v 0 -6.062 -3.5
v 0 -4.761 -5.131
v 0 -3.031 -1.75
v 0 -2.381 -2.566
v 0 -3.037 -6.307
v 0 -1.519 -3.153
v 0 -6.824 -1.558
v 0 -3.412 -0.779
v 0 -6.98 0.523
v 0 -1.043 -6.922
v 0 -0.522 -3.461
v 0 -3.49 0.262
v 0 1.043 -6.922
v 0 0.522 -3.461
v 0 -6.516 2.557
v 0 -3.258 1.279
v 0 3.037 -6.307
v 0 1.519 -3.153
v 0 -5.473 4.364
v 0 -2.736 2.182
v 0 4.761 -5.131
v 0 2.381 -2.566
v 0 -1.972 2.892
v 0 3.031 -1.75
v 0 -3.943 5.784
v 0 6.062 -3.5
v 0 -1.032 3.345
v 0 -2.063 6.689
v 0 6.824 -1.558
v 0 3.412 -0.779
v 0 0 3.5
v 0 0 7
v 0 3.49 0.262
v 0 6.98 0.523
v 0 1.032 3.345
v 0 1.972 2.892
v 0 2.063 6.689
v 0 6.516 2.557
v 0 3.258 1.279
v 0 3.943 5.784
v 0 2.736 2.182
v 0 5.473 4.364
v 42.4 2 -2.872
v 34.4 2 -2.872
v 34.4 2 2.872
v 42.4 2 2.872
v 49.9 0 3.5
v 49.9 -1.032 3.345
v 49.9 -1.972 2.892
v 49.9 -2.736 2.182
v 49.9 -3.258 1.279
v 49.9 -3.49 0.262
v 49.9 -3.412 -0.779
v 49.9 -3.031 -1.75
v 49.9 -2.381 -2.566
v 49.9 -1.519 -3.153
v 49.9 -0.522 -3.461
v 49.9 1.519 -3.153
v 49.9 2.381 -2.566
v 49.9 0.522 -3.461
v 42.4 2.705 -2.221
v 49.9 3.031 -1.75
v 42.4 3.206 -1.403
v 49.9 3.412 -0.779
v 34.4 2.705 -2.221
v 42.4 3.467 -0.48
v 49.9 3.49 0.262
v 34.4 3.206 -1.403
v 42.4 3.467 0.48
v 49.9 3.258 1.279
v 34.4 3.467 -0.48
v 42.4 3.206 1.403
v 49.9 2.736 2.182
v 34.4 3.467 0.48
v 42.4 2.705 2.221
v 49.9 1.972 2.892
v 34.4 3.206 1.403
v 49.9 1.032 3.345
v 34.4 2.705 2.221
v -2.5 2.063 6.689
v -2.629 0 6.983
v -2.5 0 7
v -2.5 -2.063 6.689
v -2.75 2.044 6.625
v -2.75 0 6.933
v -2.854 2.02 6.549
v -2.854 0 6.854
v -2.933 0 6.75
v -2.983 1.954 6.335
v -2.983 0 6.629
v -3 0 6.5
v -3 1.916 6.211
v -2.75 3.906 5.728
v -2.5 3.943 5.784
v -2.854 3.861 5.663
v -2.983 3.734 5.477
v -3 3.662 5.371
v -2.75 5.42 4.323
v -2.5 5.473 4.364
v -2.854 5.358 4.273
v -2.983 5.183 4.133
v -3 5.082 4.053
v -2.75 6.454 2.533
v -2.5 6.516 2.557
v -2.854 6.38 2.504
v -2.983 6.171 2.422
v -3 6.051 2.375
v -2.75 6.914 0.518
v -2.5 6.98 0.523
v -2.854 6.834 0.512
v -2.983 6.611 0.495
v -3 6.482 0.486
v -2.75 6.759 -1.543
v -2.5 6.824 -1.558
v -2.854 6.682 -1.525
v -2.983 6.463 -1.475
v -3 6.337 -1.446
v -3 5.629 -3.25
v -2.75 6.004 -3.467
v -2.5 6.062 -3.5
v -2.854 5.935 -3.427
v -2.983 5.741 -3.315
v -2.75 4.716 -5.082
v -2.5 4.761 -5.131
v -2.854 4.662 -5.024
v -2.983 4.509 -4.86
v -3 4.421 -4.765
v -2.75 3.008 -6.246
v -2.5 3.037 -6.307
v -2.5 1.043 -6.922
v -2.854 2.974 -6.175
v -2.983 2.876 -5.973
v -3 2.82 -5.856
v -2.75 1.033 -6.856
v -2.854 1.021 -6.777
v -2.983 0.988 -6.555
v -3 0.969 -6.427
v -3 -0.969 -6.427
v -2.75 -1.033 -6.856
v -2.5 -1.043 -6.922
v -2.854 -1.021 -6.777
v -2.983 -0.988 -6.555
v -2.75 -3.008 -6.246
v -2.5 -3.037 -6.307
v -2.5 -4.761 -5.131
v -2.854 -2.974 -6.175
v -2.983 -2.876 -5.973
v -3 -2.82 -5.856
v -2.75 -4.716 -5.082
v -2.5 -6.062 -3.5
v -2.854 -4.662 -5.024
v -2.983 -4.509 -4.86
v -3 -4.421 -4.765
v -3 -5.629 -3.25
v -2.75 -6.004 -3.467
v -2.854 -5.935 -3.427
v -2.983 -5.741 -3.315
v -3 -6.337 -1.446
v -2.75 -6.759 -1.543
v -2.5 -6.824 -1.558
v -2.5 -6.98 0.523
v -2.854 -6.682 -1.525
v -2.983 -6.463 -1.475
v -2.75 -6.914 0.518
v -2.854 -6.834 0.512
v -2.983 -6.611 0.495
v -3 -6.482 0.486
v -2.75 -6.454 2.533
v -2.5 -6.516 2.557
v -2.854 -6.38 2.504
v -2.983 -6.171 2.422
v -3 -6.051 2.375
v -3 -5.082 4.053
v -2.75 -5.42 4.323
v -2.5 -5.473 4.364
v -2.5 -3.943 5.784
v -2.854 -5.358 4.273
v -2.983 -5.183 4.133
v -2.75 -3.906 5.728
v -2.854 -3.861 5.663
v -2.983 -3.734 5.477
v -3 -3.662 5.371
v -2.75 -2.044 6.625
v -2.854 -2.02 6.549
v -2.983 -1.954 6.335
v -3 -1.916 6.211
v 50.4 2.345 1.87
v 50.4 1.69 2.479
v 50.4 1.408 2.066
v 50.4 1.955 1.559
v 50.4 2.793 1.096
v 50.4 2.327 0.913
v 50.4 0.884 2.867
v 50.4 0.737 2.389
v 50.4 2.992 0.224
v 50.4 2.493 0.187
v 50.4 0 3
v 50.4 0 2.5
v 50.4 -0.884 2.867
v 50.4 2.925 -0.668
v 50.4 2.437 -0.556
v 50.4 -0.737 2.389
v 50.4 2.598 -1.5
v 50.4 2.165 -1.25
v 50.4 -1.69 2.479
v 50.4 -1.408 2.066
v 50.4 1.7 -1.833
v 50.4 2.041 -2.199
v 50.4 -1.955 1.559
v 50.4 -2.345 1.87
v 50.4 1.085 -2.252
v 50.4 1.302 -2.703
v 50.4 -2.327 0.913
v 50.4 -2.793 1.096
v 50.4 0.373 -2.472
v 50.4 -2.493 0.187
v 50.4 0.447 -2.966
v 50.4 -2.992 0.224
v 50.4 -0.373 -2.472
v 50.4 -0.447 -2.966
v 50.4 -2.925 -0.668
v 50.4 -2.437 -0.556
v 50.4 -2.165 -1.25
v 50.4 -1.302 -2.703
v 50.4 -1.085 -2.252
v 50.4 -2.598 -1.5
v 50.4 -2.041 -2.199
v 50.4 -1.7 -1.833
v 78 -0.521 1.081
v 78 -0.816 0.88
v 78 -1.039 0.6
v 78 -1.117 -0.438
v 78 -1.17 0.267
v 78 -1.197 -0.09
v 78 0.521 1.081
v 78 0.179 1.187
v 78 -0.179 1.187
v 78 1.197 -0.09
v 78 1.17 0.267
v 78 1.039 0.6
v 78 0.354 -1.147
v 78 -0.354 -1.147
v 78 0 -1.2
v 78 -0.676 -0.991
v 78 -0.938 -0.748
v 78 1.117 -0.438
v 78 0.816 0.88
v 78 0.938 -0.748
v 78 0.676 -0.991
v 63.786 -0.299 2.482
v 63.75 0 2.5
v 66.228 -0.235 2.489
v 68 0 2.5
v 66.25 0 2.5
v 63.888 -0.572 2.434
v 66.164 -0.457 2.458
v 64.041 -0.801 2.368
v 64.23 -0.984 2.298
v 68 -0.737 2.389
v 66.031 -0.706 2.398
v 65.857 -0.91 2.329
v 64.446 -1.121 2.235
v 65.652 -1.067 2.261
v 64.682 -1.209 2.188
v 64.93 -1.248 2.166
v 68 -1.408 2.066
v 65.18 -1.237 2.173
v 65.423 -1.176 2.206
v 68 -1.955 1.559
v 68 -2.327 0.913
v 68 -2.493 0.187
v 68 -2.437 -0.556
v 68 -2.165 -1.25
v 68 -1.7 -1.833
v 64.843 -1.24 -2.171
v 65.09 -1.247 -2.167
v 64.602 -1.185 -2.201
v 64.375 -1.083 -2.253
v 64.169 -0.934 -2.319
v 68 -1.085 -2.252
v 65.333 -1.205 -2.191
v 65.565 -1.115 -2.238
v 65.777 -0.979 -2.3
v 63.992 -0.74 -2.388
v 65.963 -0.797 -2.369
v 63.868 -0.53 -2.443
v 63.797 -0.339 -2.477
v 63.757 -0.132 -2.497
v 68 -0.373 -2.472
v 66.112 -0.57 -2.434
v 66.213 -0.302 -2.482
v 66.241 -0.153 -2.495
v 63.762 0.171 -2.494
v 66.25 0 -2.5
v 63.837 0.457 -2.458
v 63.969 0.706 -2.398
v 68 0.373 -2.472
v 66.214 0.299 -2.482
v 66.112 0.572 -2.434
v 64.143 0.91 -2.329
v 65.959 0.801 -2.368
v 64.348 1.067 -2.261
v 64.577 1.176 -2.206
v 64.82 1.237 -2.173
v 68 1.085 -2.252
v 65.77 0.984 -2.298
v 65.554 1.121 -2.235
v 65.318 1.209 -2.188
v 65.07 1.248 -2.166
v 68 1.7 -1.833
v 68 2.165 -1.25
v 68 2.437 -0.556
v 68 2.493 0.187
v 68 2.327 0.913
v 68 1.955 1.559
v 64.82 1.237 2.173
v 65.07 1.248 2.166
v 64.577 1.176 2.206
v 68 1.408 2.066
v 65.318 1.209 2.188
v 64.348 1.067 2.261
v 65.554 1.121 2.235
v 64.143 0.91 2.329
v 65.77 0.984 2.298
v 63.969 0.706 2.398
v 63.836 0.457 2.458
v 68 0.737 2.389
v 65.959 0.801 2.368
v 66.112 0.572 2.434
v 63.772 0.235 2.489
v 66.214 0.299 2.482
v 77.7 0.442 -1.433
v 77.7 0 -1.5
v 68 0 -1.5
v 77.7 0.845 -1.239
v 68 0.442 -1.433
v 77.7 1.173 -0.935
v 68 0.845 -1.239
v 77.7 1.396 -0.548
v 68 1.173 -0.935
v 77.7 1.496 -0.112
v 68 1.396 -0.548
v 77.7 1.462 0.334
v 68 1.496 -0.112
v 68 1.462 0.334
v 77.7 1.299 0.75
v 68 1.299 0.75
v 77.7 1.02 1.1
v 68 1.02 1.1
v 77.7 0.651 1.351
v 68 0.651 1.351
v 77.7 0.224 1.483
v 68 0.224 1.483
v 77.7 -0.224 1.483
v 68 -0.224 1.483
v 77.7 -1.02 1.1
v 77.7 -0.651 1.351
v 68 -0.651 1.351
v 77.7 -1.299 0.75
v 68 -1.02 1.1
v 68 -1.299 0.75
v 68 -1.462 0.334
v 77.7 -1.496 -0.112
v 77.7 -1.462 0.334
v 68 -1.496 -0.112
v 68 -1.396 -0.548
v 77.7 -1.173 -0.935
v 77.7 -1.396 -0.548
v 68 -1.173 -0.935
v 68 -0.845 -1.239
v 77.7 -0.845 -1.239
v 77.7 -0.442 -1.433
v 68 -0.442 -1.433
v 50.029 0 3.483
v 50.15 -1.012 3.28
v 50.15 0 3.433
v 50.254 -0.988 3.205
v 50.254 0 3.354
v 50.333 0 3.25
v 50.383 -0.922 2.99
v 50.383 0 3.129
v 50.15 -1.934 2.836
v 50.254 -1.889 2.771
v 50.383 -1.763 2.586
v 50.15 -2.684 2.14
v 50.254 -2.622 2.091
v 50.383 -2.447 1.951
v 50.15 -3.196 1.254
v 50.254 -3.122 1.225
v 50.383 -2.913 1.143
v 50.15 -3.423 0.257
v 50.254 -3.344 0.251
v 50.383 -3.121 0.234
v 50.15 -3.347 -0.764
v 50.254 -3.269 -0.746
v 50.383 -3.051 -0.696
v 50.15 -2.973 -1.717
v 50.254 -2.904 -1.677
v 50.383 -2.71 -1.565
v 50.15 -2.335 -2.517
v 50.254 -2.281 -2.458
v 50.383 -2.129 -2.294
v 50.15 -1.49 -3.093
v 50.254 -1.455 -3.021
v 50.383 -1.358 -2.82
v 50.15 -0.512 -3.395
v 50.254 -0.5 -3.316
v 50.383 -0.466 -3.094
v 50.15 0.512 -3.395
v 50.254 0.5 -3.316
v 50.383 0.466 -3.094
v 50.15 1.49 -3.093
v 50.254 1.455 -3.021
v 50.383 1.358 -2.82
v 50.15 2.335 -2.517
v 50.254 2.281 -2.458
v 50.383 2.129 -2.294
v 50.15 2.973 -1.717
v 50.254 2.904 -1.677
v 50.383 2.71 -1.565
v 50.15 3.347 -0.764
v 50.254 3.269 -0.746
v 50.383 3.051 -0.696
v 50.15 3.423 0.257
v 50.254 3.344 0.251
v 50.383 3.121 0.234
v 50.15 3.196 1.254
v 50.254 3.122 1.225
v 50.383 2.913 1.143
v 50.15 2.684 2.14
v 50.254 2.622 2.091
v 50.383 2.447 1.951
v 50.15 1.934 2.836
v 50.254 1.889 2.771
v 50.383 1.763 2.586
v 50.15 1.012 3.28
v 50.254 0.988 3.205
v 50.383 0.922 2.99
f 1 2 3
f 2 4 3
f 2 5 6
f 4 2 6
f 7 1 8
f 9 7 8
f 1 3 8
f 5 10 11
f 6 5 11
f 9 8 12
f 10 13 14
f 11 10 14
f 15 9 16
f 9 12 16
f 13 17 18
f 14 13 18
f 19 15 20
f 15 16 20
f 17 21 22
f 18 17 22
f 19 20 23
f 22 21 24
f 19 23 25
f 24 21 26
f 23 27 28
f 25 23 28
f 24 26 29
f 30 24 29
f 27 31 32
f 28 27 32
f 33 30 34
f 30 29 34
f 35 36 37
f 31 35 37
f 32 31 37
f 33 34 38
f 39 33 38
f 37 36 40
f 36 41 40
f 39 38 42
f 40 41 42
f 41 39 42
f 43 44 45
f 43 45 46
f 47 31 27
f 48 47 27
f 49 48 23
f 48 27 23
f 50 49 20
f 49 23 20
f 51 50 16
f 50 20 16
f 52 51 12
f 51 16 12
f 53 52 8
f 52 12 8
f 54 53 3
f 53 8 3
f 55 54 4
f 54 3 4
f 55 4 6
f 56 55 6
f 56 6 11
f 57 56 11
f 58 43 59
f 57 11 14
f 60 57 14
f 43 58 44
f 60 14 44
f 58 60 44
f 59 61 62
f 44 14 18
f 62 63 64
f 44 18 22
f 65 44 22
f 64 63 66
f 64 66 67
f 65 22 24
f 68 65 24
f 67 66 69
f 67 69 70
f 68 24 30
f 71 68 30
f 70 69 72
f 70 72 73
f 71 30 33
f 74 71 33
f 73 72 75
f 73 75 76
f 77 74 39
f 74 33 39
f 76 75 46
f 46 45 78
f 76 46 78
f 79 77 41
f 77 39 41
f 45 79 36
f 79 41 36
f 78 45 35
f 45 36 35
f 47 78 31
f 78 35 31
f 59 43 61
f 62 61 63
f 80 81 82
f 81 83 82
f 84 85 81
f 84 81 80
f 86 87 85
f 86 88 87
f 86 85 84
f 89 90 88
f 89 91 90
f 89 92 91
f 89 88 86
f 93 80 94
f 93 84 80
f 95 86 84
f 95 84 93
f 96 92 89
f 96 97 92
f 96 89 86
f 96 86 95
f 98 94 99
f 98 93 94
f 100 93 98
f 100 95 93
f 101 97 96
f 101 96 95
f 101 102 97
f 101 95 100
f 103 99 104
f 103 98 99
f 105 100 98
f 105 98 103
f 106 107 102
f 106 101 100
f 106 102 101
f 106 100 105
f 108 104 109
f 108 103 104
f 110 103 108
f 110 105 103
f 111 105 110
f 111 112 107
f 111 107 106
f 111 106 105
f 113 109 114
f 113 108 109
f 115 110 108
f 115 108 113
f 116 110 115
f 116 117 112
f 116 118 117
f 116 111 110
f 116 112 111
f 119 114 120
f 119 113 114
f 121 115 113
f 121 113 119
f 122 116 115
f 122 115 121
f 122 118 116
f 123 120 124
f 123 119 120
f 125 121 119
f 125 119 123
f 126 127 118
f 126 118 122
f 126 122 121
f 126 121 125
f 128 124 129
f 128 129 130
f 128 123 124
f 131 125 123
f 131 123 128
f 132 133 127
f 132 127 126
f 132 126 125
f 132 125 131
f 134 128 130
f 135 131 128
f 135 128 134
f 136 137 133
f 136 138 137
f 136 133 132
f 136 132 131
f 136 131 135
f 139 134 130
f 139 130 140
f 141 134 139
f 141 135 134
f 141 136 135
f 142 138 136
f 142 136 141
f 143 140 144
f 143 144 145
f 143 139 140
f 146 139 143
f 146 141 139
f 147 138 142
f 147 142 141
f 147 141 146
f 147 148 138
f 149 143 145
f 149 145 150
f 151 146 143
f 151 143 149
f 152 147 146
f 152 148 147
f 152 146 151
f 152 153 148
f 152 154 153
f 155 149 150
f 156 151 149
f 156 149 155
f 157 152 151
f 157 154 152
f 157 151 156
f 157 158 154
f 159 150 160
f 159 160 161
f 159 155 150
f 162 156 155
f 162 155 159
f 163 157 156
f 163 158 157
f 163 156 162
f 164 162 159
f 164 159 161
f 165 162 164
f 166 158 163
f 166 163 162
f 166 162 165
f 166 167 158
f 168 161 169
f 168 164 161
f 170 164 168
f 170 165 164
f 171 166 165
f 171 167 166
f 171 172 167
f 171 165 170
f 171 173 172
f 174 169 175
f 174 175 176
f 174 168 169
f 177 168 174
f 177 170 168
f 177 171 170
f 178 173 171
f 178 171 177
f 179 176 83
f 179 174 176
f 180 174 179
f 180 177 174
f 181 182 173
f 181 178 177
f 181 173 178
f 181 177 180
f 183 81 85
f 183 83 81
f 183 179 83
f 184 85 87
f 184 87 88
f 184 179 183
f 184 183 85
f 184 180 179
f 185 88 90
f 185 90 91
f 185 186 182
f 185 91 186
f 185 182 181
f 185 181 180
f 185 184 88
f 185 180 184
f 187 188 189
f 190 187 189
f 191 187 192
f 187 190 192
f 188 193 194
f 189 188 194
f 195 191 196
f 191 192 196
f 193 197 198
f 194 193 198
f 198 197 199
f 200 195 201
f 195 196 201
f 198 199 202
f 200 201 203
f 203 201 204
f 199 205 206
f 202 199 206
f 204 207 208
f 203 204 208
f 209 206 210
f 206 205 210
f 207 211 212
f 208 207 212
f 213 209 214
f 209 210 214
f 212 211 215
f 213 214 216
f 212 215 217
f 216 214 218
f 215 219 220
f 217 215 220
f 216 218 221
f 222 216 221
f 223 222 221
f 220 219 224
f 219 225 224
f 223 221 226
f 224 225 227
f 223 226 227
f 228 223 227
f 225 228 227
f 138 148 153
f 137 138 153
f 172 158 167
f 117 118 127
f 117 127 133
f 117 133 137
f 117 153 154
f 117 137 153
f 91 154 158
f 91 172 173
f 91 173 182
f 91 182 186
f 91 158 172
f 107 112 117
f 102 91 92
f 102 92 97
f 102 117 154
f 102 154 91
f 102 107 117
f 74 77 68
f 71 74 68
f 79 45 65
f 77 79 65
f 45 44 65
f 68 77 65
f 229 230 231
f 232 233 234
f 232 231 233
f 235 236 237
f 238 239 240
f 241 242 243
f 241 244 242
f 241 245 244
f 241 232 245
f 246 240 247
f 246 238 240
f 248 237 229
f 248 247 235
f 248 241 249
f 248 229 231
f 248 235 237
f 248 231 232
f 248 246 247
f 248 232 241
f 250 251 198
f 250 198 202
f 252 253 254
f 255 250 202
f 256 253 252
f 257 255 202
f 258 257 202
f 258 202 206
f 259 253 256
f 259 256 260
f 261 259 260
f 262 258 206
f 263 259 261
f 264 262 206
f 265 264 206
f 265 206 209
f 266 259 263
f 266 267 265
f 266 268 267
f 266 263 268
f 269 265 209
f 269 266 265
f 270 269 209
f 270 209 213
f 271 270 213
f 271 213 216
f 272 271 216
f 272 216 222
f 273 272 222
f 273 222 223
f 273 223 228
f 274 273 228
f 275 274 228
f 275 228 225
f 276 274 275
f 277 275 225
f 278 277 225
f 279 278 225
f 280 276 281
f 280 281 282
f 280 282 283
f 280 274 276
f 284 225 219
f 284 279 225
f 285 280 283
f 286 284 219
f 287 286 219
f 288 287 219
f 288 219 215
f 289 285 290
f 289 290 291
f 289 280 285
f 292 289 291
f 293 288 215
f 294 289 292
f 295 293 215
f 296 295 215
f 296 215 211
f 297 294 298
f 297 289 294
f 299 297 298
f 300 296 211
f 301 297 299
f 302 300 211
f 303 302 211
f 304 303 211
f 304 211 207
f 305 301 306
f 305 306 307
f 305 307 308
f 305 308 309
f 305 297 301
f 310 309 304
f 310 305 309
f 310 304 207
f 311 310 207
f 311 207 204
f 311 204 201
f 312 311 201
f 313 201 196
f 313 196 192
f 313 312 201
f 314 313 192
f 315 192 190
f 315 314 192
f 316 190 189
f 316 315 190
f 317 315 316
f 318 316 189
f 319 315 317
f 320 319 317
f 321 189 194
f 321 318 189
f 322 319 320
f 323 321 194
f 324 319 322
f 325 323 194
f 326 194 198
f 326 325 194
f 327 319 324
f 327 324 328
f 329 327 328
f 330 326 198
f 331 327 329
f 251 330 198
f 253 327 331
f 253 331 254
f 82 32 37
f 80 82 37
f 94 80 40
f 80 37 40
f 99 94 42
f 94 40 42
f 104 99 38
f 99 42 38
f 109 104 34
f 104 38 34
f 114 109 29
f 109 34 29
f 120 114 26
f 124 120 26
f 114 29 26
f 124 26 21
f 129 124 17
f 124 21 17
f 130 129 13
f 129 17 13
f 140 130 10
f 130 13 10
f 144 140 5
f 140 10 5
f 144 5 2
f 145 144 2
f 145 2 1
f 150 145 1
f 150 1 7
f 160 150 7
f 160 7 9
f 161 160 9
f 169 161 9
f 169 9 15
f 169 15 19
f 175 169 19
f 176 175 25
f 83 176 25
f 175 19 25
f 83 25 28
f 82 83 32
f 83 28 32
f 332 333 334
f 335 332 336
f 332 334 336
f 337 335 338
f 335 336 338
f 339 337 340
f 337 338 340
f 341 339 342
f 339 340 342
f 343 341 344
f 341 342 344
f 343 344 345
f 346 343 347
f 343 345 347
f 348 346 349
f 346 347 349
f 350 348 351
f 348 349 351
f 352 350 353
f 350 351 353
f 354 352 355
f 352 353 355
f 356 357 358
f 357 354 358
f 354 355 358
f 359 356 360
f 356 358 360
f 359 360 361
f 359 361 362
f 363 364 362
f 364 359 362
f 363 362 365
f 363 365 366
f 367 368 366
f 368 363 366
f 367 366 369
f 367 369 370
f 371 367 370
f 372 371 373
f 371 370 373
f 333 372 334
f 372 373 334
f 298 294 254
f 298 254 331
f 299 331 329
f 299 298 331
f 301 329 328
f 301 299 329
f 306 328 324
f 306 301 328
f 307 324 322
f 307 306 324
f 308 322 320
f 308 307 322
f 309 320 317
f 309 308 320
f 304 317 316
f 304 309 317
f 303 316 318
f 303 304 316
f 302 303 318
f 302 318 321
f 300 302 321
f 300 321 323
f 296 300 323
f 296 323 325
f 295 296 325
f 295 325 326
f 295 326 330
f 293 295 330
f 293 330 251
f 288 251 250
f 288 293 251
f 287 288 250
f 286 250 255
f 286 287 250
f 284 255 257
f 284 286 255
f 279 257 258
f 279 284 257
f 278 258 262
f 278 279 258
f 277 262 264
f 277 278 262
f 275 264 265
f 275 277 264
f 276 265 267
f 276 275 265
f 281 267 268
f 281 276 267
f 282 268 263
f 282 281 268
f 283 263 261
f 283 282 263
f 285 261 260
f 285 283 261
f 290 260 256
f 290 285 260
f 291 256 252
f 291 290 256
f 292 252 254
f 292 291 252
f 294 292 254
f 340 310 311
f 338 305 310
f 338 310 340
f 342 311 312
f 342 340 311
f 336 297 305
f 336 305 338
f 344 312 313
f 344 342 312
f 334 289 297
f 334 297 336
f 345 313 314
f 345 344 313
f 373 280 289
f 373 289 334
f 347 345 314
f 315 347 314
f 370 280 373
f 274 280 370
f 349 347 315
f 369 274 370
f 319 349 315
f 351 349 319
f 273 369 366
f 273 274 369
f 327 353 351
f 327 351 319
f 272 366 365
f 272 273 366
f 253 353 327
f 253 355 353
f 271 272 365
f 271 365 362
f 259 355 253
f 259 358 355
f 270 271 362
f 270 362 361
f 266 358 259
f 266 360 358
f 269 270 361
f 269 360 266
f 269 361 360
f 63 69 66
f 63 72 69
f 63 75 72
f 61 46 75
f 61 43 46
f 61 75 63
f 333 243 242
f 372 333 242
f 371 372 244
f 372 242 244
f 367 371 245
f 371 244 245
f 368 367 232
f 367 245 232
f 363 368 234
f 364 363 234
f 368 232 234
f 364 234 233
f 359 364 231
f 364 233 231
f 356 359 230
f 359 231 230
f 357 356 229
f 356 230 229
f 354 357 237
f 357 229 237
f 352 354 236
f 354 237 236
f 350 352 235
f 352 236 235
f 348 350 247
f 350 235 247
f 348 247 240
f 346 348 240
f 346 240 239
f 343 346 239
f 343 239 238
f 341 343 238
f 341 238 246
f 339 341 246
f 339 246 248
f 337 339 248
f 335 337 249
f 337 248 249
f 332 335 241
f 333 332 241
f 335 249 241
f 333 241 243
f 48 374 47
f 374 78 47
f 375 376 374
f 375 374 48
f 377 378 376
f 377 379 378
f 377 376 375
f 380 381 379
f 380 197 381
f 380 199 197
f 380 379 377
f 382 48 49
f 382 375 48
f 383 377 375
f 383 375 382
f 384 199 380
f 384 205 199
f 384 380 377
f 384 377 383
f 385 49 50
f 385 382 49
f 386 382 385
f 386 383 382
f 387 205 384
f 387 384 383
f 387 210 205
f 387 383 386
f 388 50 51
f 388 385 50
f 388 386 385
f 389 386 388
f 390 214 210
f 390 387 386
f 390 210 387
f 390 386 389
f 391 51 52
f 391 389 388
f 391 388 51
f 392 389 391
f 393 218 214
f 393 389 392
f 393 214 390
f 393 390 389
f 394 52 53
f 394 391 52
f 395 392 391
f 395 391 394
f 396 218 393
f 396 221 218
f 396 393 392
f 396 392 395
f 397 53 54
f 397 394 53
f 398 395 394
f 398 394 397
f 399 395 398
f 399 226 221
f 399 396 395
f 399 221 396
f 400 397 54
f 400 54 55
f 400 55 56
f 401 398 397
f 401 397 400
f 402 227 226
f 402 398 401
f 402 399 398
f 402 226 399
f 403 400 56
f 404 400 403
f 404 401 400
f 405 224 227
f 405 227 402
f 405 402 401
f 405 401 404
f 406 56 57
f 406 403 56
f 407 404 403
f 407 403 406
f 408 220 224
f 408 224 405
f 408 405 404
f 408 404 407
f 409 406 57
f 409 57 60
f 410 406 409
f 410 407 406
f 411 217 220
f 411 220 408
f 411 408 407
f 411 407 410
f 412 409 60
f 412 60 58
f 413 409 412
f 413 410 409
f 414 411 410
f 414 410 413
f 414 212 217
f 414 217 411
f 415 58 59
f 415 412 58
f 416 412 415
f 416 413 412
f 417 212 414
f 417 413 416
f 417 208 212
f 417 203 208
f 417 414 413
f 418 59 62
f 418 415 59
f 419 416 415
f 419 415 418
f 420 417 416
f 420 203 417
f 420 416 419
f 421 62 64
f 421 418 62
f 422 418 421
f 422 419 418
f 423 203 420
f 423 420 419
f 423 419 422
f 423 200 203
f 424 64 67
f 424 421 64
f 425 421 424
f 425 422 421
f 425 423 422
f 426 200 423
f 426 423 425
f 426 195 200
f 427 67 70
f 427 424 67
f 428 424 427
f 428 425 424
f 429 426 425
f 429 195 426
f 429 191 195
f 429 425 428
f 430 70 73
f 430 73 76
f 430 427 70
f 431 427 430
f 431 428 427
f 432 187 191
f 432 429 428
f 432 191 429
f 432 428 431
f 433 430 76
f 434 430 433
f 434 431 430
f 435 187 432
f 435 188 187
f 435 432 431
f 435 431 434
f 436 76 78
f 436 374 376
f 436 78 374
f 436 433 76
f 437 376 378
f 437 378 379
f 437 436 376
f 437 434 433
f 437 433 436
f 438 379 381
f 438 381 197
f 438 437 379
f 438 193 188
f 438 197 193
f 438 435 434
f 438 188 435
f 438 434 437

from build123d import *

# Parameters (mm, degrees)
SKETCH_1_R               = 3.5
EXTRUDE_1_DEPTH          = 90
SKETCH_2_R               = 7
EXTRUDE_2_DEPTH          = 3
FILLET_1_R               = 0.5
CUT_EXTRUDE_1_DEPTH      = 91.542807555
CUT_EXTRUDE_1_DEPTH_BACK = 91.542807555
SKETCH_3_W               = 8
SKETCH_3_H               = 1.5
SKETCH_4_W               = 39.6
SKETCH_4_H               = 1
FILLET_2_R               = 0.5
CUT_EXTRUDE_START        = -22
SKETCH_5_R               = 2.5
SKETCH_5_R_2             = 1.5
CUT_EXTRUDE_2_DEPTH      = 22
CUT_EXTRUDE_3_DEPTH      = 91.542807555
CUT_EXTRUDE_3_DEPTH_BACK = 91.542807555
SKETCH_6_R               = 1.25
SKETCH_7_R               = 4.059056145
CUT_EXTRUDE_4_DEPTH      = 12
CHAMFER_1_SIZE           = 0.3


with BuildPart() as part:
    # 草图1 → 凸台-拉伸1 (new body)
    with BuildSketch(Plane(origin=(0, 0, 0), x_dir=(0, 0, -1), z_dir=(1, 0, 0))):
        with Locations(Location((0, 0, 0), (0, 0, 180))):
            Circle(SKETCH_1_R)
    extrude(amount=EXTRUDE_1_DEPTH)

    # 草图2 → 凸台-拉伸2 (add)
    with BuildSketch(Plane.ZY):
        Circle(SKETCH_2_R)
    extrude(amount=EXTRUDE_2_DEPTH)

    # 圆角1
    fillet_1_edges = [part.edges().sort_by_distance(p)[0] for p in [
        (-3, 0, -7),
    ]]
    fillet(fillet_1_edges, radius=FILLET_1_R)

    # 草图3 → 切除-拉伸1 (cut, two sides: drawn at the far end of the back side and taken through both)
    with BuildSketch(Plane.XY.offset(-CUT_EXTRUDE_1_DEPTH_BACK)):
        with Locations((38.4, 2.75)):
            Rectangle(SKETCH_3_W, SKETCH_3_H)
    extrude(amount=CUT_EXTRUDE_1_DEPTH + CUT_EXTRUDE_1_DEPTH_BACK, mode=Mode.SUBTRACT)

    # 草图4 → 切除-旋转1 (revolve, cut)
    with BuildSketch(Plane.XY, mode=Mode.PRIVATE) as cut_revolve_1_sk:
        with Locations((70.2, 3)):
            Rectangle(SKETCH_4_W, SKETCH_4_H)
    revolve(cut_revolve_1_sk.sketch.rotate(Axis((34.4, 0, 0), (1, 0, 0)), 90), axis=Axis((34.4, 0, 0), (1, 0, 0)), mode=Mode.SUBTRACT)

    # 圆角2
    fillet_2_edges = [part.edges().sort_by_distance(p)[0] for p in [
        (50.4, 0, -3.5),
    ]]
    fillet(fillet_2_edges, radius=FILLET_2_R)

    # 草图5 → 切除-拉伸2 (cut)
    with BuildSketch(Plane(origin=(90, 0, 0), x_dir=(0, 0, -1), z_dir=(1, 0, 0)).offset(CUT_EXTRUDE_START)):
        with Locations(Location((0, 0, 0), (0, 0, 180))):
            Circle(SKETCH_5_R)
        Circle(SKETCH_5_R_2, mode=Mode.SUBTRACT)
    extrude(amount=CUT_EXTRUDE_2_DEPTH, mode=Mode.SUBTRACT)

    # 草图6 → 切除-拉伸3 (cut, two sides: drawn at the far end of the back side and taken through both)
    with BuildSketch(Plane.XY.offset(-CUT_EXTRUDE_3_DEPTH_BACK)):
        with Locations((65, 0)):
            Circle(SKETCH_6_R)
    extrude(amount=CUT_EXTRUDE_3_DEPTH + CUT_EXTRUDE_3_DEPTH_BACK, mode=Mode.SUBTRACT)

    # 草图7 → 切除-拉伸4 (cut)
    with BuildSketch(Plane(origin=(90, 0, 0), x_dir=(0, 0, -1), z_dir=(1, 0, 0))):
        Circle(SKETCH_7_R)
    extrude(amount=-CUT_EXTRUDE_4_DEPTH, mode=Mode.SUBTRACT)

    # 倒角1
    chamfer_1_edges = [part.edges().sort_by_distance(p)[0] for p in [
        (78, 0, 1.5),
    ]]
    chamfer(chamfer_1_edges, length=CHAMFER_1_SIZE)


solid = part.part
